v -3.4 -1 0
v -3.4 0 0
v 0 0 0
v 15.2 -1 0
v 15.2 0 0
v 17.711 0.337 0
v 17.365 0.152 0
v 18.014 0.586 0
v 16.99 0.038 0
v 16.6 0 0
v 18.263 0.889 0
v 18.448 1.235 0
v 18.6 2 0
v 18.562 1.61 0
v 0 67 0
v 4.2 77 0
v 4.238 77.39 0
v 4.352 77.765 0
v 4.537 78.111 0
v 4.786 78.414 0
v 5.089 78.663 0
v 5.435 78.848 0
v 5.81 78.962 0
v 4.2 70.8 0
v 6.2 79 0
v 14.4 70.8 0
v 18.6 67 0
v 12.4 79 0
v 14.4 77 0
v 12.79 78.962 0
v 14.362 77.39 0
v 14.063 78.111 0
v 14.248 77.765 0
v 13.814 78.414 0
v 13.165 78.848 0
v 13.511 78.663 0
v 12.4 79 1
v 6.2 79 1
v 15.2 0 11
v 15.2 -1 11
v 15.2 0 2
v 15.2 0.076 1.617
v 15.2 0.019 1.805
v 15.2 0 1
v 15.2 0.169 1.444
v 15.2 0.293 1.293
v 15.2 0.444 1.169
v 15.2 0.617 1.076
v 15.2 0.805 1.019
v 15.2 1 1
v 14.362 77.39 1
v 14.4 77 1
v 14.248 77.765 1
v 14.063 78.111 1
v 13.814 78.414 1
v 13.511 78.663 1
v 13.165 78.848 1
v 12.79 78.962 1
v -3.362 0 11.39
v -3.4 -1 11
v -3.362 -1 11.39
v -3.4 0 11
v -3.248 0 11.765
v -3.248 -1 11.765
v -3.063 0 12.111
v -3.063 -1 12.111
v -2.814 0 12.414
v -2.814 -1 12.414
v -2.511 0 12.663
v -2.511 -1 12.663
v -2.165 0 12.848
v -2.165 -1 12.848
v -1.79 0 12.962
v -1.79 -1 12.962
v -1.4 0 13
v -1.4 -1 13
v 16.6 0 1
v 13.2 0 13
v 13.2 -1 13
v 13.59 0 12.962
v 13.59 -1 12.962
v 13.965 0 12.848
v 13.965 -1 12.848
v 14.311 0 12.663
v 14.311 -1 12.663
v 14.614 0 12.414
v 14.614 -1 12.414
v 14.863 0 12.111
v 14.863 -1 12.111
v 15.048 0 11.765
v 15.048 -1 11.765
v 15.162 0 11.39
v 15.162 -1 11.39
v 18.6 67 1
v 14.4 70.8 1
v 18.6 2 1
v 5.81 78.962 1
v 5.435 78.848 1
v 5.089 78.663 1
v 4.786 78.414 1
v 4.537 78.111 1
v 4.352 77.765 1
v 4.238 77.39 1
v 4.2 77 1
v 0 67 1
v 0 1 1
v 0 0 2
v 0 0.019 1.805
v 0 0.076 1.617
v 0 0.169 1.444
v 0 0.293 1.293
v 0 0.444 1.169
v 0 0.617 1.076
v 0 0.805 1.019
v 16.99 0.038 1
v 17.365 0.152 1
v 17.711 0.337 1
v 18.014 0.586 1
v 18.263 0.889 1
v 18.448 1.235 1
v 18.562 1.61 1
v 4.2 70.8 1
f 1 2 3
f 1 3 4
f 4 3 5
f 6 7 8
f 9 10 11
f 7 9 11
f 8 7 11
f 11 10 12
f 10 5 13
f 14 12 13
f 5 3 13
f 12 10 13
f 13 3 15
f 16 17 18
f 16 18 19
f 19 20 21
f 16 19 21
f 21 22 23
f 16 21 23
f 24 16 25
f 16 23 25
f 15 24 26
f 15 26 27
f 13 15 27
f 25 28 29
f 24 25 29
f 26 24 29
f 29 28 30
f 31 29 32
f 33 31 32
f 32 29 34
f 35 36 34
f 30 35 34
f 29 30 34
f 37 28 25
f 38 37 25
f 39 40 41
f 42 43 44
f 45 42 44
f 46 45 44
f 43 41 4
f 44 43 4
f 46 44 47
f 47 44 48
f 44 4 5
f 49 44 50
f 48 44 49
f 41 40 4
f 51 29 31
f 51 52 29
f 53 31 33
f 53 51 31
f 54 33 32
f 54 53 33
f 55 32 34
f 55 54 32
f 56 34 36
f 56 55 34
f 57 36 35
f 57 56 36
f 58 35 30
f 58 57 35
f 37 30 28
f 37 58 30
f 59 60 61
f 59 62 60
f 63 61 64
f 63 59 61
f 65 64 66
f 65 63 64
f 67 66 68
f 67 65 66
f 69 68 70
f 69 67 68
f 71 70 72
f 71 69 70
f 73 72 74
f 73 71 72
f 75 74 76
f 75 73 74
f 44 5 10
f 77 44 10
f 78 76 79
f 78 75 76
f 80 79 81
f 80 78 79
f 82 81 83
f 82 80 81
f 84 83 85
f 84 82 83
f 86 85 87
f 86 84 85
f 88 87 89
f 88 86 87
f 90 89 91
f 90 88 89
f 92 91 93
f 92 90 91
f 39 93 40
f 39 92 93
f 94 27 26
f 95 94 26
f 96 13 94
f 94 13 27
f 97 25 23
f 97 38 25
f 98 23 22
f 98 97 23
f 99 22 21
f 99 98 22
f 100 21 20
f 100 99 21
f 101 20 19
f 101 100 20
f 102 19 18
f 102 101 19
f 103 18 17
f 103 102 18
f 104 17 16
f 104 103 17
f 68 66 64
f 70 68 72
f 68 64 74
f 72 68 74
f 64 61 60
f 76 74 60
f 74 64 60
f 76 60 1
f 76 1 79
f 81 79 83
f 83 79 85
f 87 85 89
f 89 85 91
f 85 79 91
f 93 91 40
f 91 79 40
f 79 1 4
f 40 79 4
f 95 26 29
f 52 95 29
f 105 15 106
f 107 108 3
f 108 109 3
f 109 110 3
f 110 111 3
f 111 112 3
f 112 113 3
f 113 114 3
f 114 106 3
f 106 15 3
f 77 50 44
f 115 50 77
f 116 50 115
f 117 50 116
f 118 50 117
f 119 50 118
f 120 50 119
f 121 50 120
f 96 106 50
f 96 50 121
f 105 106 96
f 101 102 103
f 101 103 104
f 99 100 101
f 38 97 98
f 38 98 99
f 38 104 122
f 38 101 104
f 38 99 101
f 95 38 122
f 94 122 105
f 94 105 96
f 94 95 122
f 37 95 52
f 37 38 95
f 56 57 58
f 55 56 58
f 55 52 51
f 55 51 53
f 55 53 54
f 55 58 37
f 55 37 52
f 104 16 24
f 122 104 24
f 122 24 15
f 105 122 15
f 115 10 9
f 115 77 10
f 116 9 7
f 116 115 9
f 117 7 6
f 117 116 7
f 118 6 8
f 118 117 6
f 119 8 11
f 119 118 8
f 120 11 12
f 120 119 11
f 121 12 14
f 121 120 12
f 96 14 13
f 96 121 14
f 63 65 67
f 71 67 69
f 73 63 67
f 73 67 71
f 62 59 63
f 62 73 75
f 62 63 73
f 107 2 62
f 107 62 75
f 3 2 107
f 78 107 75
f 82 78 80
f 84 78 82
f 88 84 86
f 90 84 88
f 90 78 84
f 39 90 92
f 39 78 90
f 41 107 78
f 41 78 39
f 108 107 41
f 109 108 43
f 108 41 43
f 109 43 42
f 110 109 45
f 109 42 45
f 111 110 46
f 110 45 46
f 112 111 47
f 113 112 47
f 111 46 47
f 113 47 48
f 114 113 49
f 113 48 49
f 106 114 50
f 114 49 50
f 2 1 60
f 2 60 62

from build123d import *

# Parameters (mm, degrees)
F1_DEPTH = 1
F2_W     = 18.6
F2_H     = 1
F3_DEPTH = 13
F4_R     = 2
F5_R     = 1


with BuildPart() as f1:
    # F0 (on Top) → F1 (new body)
    with BuildSketch(Plane.XY):
        Polygon((0, 67), (0, 0), (18.6, 0), (18.6, 67), (14.4, 70.8), (14.4, 79), (4.2, 79), (4.2, 70.8), align=None)
    extrude(amount=F1_DEPTH)

    # F2 (on Top) → F3 (join)
    with BuildSketch(Plane.XY):
        with Locations((5.9, -0.5)):
            Rectangle(F2_W, F2_H)
    extrude(amount=F3_DEPTH)

    # F4
    f4_edges = [f1.edges().sort_by_distance(p)[0] for p in [
        (18.6, 0, 0.5),
        (15.2, -0.5, 13),
        (-3.4, -0.5, 13),
        (14.4, 79, 0.5),
        (4.2, 79, 0.5),
    ]]
    fillet(f4_edges, radius=F4_R)

    # F5
    f5_edges = [f1.edges().sort_by_distance(p)[0] for p in [
        (7.6, 0, 1),
    ]]
    fillet(f5_edges, radius=F5_R)


solid = f1.part
